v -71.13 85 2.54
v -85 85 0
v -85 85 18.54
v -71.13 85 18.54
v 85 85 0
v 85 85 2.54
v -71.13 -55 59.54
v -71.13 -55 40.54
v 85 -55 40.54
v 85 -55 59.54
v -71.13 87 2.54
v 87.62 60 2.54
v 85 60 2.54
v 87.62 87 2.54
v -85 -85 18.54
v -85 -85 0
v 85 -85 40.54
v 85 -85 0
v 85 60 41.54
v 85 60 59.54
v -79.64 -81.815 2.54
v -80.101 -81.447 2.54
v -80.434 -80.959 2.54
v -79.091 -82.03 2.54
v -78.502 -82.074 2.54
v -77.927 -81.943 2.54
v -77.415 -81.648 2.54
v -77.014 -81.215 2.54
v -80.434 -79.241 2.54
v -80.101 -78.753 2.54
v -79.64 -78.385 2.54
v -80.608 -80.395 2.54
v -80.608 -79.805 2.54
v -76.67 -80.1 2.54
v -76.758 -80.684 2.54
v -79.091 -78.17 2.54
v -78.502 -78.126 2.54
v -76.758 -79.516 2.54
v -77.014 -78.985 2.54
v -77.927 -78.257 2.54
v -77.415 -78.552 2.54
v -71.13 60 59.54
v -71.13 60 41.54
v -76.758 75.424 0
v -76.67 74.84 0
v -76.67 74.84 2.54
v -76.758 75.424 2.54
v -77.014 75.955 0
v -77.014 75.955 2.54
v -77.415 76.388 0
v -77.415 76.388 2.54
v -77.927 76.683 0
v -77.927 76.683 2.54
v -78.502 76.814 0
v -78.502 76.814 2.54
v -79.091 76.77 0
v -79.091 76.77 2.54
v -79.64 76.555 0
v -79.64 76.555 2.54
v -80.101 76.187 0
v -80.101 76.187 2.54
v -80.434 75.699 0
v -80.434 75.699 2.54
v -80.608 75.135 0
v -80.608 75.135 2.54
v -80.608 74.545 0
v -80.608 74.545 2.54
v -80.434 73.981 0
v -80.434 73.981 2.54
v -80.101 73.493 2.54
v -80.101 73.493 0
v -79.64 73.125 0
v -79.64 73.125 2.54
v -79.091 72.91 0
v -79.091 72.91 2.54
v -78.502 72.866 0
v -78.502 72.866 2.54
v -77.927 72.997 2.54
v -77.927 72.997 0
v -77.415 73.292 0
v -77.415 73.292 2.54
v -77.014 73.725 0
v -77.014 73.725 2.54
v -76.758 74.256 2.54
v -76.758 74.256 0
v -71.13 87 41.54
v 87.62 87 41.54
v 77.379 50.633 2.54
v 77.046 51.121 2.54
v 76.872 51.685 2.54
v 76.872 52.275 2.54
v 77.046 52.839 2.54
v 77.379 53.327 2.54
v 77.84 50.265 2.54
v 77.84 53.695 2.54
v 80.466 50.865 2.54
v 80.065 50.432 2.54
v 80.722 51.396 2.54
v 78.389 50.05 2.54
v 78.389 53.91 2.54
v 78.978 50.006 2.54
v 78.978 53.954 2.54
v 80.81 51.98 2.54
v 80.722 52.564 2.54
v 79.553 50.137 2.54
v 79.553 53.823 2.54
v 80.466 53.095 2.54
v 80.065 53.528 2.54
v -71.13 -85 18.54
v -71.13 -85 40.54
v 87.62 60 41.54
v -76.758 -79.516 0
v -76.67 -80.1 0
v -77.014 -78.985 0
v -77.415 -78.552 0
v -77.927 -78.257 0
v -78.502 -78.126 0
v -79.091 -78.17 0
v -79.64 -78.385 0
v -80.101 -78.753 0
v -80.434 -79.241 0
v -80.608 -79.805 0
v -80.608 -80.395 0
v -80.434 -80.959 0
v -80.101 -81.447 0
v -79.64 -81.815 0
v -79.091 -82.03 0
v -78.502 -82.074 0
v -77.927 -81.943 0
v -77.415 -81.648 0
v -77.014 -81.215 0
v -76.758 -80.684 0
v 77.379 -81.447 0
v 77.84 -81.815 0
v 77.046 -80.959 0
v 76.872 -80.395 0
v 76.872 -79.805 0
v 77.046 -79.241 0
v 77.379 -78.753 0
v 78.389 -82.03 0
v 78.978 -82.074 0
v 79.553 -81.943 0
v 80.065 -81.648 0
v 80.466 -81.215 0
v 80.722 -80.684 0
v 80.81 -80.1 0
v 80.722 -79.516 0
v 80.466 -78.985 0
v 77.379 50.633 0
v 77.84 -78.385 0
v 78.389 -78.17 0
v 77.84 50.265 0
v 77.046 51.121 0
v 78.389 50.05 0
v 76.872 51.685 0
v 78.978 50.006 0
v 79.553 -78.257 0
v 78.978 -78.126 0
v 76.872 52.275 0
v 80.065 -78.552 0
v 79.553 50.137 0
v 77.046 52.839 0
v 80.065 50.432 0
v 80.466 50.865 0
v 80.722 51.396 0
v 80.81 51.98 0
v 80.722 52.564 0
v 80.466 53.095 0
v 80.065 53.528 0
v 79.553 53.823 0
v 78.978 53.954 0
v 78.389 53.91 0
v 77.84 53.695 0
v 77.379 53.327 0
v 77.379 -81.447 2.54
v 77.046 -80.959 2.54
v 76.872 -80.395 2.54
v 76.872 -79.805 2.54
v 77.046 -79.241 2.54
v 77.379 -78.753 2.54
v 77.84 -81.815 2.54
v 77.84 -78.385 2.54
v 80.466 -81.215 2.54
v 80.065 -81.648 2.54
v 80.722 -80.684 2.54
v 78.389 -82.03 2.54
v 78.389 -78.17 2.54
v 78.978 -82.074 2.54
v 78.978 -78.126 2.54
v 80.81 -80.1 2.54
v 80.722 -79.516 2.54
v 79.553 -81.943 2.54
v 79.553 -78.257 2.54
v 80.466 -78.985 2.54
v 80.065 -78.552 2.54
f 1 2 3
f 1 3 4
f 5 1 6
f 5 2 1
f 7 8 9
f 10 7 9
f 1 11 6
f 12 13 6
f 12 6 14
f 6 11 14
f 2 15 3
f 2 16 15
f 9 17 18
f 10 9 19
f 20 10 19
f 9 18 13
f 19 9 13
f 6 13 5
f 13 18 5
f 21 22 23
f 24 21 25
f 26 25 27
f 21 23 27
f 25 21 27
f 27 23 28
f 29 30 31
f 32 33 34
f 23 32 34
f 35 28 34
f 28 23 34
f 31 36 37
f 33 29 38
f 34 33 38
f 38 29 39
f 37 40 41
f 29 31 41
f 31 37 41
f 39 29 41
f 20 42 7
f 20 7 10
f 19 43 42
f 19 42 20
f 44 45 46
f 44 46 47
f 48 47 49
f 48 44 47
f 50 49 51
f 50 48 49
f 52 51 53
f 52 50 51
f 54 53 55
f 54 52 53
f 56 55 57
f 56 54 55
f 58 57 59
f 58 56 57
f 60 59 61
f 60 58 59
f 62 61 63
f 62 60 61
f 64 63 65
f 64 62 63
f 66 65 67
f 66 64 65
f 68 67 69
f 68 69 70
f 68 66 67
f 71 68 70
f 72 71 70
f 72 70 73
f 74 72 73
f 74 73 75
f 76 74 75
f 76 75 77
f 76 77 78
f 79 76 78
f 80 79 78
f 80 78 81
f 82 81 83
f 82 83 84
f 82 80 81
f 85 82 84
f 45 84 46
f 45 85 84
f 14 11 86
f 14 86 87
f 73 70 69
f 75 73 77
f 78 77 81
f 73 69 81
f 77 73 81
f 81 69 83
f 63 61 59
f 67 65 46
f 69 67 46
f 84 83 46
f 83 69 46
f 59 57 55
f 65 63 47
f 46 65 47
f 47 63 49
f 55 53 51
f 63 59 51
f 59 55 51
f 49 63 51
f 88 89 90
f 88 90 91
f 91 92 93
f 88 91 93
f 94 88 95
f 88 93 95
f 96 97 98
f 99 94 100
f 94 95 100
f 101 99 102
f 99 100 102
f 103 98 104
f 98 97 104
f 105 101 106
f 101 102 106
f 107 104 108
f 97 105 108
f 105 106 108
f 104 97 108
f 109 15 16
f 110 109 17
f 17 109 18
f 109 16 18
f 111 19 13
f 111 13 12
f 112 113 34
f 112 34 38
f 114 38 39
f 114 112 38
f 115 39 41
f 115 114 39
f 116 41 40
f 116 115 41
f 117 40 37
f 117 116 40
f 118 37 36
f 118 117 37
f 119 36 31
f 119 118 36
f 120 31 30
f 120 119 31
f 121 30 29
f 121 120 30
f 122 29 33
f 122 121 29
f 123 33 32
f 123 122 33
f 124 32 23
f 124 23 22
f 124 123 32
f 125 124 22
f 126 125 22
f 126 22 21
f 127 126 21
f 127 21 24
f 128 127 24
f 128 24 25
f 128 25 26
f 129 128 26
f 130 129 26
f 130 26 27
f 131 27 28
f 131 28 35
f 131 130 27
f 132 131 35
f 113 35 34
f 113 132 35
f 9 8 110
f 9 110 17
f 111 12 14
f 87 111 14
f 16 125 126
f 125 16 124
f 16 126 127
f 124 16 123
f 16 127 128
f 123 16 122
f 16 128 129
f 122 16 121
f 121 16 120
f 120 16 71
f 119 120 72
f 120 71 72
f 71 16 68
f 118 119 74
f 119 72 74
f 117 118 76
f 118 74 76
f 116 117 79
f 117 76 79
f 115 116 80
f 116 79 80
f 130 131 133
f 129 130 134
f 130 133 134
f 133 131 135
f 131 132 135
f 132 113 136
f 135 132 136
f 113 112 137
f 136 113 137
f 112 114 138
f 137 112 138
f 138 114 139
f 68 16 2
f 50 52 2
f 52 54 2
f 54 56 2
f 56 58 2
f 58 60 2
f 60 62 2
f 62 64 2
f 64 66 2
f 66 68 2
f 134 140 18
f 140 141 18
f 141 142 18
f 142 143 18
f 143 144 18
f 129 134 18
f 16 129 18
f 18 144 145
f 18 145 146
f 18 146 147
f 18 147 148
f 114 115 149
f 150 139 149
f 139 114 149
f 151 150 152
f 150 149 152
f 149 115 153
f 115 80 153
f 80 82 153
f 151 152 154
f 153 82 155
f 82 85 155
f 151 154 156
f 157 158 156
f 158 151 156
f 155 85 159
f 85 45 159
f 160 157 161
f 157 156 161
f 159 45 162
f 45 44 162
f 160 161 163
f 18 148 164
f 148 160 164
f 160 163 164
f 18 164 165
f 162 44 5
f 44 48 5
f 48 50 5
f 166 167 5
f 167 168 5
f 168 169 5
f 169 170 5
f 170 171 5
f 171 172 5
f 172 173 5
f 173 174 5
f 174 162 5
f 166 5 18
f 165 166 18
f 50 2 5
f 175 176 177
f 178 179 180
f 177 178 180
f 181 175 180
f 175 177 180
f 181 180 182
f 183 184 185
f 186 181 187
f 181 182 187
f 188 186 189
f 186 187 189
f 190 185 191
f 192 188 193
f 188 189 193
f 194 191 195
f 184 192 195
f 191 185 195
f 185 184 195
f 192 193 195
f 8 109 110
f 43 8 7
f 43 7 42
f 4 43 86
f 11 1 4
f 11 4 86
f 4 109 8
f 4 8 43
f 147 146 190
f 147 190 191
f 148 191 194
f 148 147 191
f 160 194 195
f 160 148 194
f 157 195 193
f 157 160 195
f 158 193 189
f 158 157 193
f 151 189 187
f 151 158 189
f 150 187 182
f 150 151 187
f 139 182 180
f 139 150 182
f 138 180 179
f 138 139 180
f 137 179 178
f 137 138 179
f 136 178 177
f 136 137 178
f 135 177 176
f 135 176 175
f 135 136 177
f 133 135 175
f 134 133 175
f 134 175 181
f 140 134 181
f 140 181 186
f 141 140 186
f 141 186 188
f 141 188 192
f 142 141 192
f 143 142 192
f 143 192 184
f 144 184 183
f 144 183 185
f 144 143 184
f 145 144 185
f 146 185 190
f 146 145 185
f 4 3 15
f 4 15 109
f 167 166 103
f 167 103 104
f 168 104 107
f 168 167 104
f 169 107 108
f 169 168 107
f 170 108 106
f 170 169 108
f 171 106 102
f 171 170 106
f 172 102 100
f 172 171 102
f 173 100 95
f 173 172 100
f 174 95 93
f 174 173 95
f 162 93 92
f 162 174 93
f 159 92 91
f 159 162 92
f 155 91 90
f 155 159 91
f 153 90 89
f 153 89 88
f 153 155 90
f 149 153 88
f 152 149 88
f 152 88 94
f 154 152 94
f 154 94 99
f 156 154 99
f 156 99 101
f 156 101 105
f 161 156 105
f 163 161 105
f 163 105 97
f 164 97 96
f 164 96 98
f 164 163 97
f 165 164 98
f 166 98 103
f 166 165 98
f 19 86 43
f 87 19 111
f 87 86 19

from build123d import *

# Parameters (mm, degrees)
SKETCH1_W           = 170
SKETCH1_H           = 170
SKETCH1_R           = 1.98
BOSS_EXTRUDE1_DEPTH = 2.54
SKETCH2_W           = 158.75
SKETCH2_H           = 27
BOSS_EXTRUDE2_DEPTH = 39
SKETCH4_W           = 13.87
SKETCH4_H           = 170
BOSS_EXTRUDE3_DEPTH = 16
SKETCH6_W           = 156.13
SKETCH6_H           = 30
BOSS_EXTRUDE4_DEPTH = 38
SKETCH5_W           = 156.13
SKETCH5_H           = 115
BOSS_EXTRUDE5_DEPTH = 57


with BuildPart() as part:
    # Sketch1 → Boss-Extrude1 (new body)
    with BuildSketch(Plane.XY):
        Rectangle(SKETCH1_W, SKETCH1_H)
        with Locations((-78.65, 74.84)):
            Circle(SKETCH1_R, mode=Mode.SUBTRACT)
        with Locations((78.83, 51.98)):
            Circle(SKETCH1_R, mode=Mode.SUBTRACT)
        with Locations((-78.65, -80.1)):
            Circle(SKETCH1_R, mode=Mode.SUBTRACT)
        with Locations((78.83, -80.1)):
            Circle(SKETCH1_R, mode=Mode.SUBTRACT)
    extrude(amount=BOSS_EXTRUDE1_DEPTH)

    # Sketch2 → Boss-Extrude2 (add)
    with BuildSketch(Plane.XY.offset(2.54)):
        with Locations((8.245, 73.5)):
            Rectangle(SKETCH2_W, SKETCH2_H)
    extrude(amount=BOSS_EXTRUDE2_DEPTH)

    # Sketch4 → Boss-Extrude3 (add)
    with BuildSketch(Plane.XY.offset(2.54)):
        with Locations((-78.065, 0)):
            Rectangle(SKETCH4_W, SKETCH4_H)
    extrude(amount=BOSS_EXTRUDE3_DEPTH)

    # Sketch6 → Boss-Extrude4 (add)
    with BuildSketch(Plane.XY.offset(2.54)):
        with Locations((6.935, -70)):
            Rectangle(SKETCH6_W, SKETCH6_H)
    extrude(amount=BOSS_EXTRUDE4_DEPTH)

    # Sketch5 → Boss-Extrude5 (add)
    with BuildSketch(Plane.XY.offset(2.54)):
        with Locations((6.935, 2.5)):
            Rectangle(SKETCH5_W, SKETCH5_H)
    extrude(amount=BOSS_EXTRUDE5_DEPTH)


solid = part.part
